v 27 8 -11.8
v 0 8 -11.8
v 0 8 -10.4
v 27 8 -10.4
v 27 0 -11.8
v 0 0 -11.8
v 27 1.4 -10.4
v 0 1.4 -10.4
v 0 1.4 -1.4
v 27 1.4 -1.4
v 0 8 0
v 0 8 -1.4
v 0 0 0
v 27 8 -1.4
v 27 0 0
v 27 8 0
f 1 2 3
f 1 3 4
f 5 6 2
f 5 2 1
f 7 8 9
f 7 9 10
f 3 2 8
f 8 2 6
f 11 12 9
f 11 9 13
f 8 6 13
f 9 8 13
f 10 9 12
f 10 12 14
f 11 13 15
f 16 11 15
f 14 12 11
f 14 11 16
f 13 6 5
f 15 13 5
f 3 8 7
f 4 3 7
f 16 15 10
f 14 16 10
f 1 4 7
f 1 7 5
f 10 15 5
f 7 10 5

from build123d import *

# Parameters (mm, degrees)
SKETCH_1_W      = 27
SKETCH_1_H      = 11.8
BOTTOM_DEPTH    = 1.4
SKETCH_1_3_W    = 27
SKETCH_1_3_H    = 1.4
EXTRUDE_2_DEPTH = 8


with BuildPart() as part:
    # Эскиз1 → Bottom (new body)
    with BuildSketch(Plane(origin=(0, 0, 0), x_dir=(1, 0, 0), z_dir=(0, 1, 0))):
        with Locations((13.5, 5.9)):
            Rectangle(SKETCH_1_W, SKETCH_1_H)
    extrude(amount=BOTTOM_DEPTH)

    # Эскиз1<3> → Бобышка-Вытянуть2 (add)
    with BuildSketch(Plane(origin=(0, 0, 0), x_dir=(1, 0, 0), z_dir=(0, 1, 0))):
        with Locations((13.5, 11.1)):
            Rectangle(SKETCH_1_3_W, SKETCH_1_3_H)
        with Locations((13.5, 0.7)):
            Rectangle(SKETCH_1_3_W, SKETCH_1_3_H)
    extrude(amount=EXTRUDE_2_DEPTH)


solid = part.part
